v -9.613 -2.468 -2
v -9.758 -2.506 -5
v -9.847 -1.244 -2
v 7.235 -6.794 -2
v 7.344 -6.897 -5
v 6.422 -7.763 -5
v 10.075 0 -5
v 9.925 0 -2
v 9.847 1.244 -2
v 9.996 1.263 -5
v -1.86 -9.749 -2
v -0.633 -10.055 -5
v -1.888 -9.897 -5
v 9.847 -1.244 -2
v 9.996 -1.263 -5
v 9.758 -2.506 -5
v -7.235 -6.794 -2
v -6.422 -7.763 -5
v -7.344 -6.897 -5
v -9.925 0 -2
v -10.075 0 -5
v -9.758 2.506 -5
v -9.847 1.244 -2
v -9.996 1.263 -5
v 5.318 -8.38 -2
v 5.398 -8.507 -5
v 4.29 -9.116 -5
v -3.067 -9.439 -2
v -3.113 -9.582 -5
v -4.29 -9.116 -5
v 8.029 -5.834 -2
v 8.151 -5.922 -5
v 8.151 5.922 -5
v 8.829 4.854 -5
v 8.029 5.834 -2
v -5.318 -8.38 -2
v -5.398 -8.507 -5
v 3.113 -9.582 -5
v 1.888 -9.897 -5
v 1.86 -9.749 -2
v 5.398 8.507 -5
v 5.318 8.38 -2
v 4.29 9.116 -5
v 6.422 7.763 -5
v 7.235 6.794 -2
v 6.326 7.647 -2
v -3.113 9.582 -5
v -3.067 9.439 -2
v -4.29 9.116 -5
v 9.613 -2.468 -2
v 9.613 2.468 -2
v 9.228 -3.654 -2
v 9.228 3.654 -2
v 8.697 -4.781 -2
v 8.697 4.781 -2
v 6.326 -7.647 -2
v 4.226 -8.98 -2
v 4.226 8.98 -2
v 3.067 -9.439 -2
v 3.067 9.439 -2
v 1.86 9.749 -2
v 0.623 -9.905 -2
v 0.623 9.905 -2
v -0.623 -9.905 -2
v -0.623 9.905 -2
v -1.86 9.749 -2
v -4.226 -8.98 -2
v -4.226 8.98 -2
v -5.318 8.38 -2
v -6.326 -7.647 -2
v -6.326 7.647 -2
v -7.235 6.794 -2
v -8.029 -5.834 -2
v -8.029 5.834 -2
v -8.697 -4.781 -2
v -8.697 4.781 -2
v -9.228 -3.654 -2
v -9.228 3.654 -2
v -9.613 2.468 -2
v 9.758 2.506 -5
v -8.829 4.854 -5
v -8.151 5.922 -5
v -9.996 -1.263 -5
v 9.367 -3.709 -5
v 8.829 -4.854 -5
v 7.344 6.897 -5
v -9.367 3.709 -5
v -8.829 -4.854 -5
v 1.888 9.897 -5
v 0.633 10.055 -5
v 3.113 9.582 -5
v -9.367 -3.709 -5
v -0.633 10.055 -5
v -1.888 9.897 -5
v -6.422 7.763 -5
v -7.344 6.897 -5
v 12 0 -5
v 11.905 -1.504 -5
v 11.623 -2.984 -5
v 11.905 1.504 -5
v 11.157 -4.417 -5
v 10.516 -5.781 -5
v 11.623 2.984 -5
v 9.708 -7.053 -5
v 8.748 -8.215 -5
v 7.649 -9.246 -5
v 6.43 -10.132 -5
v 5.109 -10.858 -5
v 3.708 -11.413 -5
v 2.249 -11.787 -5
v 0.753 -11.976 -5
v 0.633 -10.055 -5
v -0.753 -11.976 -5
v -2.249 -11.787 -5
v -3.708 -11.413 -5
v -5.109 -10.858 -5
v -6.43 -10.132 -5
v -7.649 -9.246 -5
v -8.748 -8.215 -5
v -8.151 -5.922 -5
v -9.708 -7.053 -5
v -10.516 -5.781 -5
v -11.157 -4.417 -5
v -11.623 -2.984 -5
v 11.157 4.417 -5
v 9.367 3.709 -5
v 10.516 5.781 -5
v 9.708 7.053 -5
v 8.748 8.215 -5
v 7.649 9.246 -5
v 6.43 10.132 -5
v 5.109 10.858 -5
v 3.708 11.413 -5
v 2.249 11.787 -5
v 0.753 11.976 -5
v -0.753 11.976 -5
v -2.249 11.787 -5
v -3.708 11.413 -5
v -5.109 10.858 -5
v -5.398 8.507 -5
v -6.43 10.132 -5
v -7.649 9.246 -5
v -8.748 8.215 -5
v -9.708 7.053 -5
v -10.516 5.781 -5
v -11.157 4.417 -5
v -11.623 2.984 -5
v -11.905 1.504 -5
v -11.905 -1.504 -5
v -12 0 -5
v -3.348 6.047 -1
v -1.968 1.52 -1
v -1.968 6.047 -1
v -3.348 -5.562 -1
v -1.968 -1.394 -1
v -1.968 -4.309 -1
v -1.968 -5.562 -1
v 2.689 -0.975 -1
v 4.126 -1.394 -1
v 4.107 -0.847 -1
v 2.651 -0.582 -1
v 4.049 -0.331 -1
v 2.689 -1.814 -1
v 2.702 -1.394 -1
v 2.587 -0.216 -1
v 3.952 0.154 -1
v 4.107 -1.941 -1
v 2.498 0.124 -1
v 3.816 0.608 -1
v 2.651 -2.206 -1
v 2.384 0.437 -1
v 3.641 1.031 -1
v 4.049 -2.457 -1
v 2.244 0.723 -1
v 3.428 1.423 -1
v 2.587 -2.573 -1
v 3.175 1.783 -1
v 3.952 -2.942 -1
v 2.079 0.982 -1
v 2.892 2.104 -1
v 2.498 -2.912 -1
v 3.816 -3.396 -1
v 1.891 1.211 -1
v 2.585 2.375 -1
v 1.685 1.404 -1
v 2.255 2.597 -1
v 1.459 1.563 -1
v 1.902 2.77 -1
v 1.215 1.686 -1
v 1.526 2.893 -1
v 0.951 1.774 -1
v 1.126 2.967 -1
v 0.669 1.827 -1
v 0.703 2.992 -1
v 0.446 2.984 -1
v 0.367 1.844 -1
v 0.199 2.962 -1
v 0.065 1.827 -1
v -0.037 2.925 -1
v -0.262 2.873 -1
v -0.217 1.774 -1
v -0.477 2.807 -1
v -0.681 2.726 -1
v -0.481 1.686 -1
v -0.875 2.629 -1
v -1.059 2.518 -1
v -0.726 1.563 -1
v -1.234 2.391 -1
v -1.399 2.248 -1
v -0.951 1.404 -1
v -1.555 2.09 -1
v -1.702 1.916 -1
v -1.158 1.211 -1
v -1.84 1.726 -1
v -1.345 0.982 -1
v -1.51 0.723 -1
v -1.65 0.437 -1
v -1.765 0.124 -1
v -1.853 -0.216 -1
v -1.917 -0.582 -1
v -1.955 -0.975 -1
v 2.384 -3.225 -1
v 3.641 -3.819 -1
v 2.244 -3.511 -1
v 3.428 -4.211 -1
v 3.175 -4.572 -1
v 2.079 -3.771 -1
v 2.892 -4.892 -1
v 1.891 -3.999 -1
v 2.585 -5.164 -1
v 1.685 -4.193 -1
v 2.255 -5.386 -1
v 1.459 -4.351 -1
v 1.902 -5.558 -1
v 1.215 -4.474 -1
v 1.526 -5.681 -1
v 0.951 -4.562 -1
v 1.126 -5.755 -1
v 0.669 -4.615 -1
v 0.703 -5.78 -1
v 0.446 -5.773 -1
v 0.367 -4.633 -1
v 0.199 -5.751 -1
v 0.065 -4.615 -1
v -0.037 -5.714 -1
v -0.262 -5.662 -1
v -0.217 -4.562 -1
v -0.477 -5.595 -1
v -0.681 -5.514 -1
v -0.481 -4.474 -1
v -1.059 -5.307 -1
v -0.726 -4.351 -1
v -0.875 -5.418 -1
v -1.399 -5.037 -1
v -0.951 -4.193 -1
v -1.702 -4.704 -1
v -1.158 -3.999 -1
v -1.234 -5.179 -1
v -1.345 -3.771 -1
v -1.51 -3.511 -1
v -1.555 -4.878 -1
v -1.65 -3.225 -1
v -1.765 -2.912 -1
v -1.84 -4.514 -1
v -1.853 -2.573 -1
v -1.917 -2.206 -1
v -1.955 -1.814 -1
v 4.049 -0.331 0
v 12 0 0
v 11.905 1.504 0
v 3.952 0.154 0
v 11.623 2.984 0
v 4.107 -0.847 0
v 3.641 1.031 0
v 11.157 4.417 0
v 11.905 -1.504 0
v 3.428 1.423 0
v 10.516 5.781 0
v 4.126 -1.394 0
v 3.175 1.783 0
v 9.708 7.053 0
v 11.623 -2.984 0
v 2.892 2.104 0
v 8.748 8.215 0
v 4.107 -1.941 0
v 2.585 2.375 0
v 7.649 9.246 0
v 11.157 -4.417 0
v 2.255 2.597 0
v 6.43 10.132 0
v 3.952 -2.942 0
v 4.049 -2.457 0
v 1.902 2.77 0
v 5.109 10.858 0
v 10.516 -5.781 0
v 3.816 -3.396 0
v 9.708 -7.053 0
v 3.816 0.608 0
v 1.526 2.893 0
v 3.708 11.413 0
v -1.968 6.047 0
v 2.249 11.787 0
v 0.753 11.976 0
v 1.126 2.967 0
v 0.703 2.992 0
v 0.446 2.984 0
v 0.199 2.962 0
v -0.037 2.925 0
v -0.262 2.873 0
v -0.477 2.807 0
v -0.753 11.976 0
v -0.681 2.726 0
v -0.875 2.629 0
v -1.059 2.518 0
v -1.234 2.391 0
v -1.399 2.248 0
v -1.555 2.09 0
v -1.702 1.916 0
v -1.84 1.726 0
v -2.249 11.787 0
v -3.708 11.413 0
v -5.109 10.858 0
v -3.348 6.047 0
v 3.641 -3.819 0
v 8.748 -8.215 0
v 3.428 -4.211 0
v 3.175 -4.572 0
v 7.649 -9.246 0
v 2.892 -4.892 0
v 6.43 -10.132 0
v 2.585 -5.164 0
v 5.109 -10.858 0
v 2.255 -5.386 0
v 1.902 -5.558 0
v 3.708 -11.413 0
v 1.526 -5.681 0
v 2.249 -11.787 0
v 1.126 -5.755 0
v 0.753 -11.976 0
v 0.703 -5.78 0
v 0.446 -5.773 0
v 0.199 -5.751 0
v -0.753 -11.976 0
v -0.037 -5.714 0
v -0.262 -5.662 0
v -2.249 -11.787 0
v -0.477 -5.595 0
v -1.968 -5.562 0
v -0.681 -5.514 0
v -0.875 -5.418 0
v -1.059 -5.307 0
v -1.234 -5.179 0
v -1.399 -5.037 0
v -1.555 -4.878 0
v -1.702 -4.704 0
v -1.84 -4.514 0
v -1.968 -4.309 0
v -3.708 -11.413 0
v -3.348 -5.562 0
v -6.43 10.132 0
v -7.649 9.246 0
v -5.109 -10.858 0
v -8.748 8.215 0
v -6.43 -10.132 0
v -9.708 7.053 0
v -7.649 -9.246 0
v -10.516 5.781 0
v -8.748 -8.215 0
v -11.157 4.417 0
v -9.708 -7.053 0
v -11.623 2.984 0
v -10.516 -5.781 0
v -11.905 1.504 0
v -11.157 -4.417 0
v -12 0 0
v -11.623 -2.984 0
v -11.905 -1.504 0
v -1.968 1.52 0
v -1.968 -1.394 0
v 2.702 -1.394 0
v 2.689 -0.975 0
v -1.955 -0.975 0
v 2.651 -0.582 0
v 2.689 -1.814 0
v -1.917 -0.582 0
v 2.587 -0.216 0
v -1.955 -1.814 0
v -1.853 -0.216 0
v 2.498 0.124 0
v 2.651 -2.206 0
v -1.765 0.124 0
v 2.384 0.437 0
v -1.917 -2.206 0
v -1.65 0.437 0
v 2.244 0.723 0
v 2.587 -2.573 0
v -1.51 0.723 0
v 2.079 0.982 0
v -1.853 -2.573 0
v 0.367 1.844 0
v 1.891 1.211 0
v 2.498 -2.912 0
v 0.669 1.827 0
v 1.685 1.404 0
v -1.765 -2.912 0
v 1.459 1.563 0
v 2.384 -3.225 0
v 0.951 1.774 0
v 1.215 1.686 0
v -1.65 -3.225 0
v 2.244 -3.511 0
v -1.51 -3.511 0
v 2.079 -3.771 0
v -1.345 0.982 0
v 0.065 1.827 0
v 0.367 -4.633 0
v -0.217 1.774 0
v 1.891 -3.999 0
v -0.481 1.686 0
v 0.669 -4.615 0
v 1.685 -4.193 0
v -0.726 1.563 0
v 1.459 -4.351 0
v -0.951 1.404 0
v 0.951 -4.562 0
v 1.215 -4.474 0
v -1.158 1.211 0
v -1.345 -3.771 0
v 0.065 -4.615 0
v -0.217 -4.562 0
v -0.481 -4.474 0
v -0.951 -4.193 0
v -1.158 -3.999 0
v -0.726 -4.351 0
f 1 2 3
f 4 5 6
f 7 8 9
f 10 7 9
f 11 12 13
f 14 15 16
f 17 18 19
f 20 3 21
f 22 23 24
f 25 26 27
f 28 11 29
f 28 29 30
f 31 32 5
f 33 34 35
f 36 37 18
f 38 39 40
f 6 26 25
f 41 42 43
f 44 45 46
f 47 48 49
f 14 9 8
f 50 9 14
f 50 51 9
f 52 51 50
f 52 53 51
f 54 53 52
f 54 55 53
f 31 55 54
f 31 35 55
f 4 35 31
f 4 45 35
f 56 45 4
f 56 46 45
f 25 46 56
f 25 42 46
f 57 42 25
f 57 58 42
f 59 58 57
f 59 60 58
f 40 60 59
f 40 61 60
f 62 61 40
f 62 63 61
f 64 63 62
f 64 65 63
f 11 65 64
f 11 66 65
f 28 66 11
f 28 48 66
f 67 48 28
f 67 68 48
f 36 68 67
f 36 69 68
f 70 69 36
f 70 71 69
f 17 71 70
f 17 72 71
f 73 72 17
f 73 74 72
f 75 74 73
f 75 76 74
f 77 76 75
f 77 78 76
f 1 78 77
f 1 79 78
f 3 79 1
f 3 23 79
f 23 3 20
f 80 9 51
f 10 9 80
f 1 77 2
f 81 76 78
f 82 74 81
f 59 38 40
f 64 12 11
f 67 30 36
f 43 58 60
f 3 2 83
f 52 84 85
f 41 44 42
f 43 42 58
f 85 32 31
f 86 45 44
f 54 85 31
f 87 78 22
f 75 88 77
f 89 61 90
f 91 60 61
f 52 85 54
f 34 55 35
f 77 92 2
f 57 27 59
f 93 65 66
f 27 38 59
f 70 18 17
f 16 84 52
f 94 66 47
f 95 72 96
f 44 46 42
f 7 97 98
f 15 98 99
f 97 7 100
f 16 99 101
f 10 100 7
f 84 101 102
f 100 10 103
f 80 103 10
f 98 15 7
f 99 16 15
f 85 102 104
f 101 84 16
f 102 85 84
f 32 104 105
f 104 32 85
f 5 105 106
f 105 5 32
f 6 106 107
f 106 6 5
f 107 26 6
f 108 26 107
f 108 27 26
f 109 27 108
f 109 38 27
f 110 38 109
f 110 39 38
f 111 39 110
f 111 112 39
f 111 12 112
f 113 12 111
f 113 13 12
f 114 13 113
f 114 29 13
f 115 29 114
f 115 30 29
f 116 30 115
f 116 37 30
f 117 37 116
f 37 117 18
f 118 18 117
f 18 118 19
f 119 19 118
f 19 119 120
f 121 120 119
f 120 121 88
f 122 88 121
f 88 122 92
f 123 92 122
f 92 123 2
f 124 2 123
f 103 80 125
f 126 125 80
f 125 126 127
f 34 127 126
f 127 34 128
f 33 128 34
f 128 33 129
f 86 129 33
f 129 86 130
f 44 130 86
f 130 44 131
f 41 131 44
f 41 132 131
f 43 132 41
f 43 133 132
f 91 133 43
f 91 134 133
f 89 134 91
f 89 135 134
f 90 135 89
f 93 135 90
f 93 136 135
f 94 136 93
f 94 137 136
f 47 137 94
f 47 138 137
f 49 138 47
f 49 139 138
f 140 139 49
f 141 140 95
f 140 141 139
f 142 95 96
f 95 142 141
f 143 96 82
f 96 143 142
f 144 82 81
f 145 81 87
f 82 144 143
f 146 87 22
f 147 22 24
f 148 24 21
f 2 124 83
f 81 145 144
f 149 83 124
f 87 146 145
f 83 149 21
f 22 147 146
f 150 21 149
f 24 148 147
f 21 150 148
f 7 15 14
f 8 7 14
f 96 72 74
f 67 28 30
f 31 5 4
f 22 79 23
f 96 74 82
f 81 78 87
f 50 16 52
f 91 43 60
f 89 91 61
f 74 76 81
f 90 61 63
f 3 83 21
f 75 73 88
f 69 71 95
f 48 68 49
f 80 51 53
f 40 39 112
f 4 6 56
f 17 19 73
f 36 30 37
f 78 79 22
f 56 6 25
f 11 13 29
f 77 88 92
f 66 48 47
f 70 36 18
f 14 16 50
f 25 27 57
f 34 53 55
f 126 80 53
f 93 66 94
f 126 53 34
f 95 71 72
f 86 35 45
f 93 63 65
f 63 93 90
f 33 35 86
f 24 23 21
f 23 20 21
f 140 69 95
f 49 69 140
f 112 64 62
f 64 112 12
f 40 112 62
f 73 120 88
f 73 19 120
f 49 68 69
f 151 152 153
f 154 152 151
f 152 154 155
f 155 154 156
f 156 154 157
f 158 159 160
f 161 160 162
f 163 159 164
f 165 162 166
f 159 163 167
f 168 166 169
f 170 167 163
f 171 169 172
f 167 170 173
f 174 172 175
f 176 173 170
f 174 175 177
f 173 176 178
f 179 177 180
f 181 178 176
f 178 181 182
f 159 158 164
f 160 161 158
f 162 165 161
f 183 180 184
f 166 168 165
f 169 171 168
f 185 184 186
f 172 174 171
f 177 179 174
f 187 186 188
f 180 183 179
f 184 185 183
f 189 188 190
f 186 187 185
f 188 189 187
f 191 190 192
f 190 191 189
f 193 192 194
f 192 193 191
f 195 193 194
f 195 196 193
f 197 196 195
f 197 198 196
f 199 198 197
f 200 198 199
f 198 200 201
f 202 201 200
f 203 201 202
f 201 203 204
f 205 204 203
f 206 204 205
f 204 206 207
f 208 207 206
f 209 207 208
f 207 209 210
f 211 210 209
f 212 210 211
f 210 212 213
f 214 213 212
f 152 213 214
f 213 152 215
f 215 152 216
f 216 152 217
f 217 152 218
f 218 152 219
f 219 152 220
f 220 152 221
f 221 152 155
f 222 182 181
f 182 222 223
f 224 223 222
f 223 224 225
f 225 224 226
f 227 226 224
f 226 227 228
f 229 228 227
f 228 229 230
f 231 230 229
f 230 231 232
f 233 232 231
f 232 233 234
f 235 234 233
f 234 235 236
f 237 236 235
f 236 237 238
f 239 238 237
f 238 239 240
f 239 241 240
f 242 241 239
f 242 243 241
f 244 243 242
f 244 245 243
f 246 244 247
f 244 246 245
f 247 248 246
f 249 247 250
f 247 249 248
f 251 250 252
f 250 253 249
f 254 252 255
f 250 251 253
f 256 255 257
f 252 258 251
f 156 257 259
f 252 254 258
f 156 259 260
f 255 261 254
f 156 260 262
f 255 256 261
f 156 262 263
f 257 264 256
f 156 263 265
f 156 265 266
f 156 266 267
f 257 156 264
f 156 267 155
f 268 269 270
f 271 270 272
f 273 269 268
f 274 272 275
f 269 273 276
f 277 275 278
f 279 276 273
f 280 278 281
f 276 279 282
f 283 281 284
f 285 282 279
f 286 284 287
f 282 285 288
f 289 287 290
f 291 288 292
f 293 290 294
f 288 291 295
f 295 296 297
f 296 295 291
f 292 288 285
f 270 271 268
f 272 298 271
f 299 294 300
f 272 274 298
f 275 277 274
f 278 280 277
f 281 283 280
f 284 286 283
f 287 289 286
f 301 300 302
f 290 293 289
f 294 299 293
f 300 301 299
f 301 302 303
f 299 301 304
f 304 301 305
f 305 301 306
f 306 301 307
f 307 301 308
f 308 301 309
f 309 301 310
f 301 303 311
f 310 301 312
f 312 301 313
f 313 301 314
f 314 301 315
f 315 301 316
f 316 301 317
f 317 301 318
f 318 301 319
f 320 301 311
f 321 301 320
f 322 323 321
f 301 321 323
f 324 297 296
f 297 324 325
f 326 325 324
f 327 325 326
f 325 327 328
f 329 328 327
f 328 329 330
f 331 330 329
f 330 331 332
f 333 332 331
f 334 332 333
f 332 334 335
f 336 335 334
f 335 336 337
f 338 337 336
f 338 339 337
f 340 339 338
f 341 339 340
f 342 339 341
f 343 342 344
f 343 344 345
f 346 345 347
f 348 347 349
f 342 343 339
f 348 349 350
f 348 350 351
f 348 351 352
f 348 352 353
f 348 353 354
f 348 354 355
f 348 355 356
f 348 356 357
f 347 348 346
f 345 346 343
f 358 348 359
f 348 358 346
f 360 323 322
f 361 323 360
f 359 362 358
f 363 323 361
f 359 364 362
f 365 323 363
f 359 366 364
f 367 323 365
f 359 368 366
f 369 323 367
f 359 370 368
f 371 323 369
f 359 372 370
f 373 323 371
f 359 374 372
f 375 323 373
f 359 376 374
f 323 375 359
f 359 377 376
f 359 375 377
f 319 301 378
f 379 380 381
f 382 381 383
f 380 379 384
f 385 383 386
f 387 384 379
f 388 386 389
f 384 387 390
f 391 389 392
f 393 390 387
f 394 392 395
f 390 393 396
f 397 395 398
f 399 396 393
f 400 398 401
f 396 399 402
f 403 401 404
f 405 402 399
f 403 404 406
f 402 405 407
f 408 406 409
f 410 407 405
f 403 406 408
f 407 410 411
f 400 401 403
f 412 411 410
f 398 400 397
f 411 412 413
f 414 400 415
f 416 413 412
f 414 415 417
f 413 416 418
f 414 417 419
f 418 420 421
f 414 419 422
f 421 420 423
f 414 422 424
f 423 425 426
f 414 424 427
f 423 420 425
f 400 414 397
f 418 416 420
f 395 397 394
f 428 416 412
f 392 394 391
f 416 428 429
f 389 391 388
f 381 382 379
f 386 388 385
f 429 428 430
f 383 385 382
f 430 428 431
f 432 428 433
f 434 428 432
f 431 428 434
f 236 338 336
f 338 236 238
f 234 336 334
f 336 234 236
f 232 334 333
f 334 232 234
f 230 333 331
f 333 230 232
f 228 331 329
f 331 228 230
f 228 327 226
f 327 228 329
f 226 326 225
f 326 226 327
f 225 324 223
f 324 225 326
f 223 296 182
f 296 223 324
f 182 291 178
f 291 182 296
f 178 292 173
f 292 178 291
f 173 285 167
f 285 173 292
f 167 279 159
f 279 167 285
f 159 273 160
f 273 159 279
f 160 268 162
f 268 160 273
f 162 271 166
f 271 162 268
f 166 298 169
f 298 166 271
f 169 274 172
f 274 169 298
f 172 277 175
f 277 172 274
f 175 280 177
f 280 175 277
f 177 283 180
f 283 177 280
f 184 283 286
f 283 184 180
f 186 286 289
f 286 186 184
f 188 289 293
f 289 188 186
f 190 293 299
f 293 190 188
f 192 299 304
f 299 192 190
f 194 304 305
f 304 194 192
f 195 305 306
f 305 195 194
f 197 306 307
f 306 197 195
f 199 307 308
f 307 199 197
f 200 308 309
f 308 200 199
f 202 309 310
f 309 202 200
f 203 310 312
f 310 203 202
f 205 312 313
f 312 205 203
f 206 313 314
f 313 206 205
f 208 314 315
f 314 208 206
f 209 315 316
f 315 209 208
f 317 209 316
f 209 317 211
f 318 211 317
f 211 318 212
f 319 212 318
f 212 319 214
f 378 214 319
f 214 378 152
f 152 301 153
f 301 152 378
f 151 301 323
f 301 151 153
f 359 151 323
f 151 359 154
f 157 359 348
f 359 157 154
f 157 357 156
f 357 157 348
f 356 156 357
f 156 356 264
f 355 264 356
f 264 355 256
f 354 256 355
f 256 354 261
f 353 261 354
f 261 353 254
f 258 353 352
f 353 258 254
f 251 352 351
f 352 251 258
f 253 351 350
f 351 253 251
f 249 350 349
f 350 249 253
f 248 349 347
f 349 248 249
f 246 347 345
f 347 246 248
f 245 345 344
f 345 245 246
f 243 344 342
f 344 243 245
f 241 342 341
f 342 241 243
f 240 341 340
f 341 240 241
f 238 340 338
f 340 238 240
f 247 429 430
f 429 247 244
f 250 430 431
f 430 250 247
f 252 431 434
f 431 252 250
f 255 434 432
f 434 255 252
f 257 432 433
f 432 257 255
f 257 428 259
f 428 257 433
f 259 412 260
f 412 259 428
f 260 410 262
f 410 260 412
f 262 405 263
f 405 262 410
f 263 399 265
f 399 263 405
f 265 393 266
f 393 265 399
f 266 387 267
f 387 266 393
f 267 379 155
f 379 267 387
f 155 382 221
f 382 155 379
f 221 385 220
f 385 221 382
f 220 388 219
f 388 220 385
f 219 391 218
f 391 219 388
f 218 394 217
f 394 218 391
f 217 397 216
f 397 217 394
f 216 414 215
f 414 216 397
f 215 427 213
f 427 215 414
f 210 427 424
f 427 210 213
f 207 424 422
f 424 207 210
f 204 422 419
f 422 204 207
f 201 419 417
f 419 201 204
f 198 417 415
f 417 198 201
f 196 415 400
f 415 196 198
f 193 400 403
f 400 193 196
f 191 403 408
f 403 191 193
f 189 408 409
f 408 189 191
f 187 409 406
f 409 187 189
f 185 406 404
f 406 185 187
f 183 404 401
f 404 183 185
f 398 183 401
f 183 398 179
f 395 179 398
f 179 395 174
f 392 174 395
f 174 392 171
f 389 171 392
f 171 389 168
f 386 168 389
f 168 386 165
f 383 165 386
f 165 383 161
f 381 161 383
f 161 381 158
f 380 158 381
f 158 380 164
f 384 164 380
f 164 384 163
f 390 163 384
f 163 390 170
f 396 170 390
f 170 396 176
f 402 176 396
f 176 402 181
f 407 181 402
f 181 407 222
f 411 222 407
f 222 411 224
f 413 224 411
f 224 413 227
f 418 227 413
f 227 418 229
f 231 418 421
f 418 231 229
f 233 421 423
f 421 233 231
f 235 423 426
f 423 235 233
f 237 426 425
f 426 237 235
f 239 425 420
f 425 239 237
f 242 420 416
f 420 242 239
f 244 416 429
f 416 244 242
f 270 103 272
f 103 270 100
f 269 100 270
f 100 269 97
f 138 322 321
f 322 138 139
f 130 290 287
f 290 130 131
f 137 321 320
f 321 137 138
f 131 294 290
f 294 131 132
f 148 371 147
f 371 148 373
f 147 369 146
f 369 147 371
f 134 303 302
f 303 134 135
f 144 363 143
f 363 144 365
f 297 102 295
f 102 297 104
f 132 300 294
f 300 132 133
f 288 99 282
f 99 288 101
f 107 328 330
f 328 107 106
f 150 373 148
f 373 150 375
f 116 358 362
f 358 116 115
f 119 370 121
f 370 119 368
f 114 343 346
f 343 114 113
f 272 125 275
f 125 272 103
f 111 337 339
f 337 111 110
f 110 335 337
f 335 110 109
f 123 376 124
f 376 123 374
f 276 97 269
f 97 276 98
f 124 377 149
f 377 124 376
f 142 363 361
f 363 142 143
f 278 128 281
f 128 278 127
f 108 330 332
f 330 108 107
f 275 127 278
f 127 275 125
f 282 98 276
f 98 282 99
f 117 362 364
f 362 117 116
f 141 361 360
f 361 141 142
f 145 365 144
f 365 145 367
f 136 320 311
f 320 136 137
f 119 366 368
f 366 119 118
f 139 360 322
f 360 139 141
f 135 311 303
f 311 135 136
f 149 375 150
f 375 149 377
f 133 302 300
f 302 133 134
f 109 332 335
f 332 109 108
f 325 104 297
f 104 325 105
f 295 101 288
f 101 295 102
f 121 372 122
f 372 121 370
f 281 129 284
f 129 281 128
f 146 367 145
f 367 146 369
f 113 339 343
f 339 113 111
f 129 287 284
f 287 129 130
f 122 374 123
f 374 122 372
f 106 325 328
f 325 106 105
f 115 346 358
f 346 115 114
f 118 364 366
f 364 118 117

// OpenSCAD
$fn = 50;


difference() {
	union() {
		translate(v = [0, 0, -5.0000000000]) {
			cylinder(h = 5, r = 12.0000000000);
		}
	}
	union() {
		#translate(v = [0, 0, -5.0000000000]) {
			cylinder(h = 3, r1 = 10.0750000000, r2 = 9.9250000000);
		}
		translate(v = [0, 0, -1]) {
			linear_extrude(height = 1) {
				text(font = "Webdings", halign = "center", size = 11, text = "b", valign = "center");
			}
		}
	}
}
